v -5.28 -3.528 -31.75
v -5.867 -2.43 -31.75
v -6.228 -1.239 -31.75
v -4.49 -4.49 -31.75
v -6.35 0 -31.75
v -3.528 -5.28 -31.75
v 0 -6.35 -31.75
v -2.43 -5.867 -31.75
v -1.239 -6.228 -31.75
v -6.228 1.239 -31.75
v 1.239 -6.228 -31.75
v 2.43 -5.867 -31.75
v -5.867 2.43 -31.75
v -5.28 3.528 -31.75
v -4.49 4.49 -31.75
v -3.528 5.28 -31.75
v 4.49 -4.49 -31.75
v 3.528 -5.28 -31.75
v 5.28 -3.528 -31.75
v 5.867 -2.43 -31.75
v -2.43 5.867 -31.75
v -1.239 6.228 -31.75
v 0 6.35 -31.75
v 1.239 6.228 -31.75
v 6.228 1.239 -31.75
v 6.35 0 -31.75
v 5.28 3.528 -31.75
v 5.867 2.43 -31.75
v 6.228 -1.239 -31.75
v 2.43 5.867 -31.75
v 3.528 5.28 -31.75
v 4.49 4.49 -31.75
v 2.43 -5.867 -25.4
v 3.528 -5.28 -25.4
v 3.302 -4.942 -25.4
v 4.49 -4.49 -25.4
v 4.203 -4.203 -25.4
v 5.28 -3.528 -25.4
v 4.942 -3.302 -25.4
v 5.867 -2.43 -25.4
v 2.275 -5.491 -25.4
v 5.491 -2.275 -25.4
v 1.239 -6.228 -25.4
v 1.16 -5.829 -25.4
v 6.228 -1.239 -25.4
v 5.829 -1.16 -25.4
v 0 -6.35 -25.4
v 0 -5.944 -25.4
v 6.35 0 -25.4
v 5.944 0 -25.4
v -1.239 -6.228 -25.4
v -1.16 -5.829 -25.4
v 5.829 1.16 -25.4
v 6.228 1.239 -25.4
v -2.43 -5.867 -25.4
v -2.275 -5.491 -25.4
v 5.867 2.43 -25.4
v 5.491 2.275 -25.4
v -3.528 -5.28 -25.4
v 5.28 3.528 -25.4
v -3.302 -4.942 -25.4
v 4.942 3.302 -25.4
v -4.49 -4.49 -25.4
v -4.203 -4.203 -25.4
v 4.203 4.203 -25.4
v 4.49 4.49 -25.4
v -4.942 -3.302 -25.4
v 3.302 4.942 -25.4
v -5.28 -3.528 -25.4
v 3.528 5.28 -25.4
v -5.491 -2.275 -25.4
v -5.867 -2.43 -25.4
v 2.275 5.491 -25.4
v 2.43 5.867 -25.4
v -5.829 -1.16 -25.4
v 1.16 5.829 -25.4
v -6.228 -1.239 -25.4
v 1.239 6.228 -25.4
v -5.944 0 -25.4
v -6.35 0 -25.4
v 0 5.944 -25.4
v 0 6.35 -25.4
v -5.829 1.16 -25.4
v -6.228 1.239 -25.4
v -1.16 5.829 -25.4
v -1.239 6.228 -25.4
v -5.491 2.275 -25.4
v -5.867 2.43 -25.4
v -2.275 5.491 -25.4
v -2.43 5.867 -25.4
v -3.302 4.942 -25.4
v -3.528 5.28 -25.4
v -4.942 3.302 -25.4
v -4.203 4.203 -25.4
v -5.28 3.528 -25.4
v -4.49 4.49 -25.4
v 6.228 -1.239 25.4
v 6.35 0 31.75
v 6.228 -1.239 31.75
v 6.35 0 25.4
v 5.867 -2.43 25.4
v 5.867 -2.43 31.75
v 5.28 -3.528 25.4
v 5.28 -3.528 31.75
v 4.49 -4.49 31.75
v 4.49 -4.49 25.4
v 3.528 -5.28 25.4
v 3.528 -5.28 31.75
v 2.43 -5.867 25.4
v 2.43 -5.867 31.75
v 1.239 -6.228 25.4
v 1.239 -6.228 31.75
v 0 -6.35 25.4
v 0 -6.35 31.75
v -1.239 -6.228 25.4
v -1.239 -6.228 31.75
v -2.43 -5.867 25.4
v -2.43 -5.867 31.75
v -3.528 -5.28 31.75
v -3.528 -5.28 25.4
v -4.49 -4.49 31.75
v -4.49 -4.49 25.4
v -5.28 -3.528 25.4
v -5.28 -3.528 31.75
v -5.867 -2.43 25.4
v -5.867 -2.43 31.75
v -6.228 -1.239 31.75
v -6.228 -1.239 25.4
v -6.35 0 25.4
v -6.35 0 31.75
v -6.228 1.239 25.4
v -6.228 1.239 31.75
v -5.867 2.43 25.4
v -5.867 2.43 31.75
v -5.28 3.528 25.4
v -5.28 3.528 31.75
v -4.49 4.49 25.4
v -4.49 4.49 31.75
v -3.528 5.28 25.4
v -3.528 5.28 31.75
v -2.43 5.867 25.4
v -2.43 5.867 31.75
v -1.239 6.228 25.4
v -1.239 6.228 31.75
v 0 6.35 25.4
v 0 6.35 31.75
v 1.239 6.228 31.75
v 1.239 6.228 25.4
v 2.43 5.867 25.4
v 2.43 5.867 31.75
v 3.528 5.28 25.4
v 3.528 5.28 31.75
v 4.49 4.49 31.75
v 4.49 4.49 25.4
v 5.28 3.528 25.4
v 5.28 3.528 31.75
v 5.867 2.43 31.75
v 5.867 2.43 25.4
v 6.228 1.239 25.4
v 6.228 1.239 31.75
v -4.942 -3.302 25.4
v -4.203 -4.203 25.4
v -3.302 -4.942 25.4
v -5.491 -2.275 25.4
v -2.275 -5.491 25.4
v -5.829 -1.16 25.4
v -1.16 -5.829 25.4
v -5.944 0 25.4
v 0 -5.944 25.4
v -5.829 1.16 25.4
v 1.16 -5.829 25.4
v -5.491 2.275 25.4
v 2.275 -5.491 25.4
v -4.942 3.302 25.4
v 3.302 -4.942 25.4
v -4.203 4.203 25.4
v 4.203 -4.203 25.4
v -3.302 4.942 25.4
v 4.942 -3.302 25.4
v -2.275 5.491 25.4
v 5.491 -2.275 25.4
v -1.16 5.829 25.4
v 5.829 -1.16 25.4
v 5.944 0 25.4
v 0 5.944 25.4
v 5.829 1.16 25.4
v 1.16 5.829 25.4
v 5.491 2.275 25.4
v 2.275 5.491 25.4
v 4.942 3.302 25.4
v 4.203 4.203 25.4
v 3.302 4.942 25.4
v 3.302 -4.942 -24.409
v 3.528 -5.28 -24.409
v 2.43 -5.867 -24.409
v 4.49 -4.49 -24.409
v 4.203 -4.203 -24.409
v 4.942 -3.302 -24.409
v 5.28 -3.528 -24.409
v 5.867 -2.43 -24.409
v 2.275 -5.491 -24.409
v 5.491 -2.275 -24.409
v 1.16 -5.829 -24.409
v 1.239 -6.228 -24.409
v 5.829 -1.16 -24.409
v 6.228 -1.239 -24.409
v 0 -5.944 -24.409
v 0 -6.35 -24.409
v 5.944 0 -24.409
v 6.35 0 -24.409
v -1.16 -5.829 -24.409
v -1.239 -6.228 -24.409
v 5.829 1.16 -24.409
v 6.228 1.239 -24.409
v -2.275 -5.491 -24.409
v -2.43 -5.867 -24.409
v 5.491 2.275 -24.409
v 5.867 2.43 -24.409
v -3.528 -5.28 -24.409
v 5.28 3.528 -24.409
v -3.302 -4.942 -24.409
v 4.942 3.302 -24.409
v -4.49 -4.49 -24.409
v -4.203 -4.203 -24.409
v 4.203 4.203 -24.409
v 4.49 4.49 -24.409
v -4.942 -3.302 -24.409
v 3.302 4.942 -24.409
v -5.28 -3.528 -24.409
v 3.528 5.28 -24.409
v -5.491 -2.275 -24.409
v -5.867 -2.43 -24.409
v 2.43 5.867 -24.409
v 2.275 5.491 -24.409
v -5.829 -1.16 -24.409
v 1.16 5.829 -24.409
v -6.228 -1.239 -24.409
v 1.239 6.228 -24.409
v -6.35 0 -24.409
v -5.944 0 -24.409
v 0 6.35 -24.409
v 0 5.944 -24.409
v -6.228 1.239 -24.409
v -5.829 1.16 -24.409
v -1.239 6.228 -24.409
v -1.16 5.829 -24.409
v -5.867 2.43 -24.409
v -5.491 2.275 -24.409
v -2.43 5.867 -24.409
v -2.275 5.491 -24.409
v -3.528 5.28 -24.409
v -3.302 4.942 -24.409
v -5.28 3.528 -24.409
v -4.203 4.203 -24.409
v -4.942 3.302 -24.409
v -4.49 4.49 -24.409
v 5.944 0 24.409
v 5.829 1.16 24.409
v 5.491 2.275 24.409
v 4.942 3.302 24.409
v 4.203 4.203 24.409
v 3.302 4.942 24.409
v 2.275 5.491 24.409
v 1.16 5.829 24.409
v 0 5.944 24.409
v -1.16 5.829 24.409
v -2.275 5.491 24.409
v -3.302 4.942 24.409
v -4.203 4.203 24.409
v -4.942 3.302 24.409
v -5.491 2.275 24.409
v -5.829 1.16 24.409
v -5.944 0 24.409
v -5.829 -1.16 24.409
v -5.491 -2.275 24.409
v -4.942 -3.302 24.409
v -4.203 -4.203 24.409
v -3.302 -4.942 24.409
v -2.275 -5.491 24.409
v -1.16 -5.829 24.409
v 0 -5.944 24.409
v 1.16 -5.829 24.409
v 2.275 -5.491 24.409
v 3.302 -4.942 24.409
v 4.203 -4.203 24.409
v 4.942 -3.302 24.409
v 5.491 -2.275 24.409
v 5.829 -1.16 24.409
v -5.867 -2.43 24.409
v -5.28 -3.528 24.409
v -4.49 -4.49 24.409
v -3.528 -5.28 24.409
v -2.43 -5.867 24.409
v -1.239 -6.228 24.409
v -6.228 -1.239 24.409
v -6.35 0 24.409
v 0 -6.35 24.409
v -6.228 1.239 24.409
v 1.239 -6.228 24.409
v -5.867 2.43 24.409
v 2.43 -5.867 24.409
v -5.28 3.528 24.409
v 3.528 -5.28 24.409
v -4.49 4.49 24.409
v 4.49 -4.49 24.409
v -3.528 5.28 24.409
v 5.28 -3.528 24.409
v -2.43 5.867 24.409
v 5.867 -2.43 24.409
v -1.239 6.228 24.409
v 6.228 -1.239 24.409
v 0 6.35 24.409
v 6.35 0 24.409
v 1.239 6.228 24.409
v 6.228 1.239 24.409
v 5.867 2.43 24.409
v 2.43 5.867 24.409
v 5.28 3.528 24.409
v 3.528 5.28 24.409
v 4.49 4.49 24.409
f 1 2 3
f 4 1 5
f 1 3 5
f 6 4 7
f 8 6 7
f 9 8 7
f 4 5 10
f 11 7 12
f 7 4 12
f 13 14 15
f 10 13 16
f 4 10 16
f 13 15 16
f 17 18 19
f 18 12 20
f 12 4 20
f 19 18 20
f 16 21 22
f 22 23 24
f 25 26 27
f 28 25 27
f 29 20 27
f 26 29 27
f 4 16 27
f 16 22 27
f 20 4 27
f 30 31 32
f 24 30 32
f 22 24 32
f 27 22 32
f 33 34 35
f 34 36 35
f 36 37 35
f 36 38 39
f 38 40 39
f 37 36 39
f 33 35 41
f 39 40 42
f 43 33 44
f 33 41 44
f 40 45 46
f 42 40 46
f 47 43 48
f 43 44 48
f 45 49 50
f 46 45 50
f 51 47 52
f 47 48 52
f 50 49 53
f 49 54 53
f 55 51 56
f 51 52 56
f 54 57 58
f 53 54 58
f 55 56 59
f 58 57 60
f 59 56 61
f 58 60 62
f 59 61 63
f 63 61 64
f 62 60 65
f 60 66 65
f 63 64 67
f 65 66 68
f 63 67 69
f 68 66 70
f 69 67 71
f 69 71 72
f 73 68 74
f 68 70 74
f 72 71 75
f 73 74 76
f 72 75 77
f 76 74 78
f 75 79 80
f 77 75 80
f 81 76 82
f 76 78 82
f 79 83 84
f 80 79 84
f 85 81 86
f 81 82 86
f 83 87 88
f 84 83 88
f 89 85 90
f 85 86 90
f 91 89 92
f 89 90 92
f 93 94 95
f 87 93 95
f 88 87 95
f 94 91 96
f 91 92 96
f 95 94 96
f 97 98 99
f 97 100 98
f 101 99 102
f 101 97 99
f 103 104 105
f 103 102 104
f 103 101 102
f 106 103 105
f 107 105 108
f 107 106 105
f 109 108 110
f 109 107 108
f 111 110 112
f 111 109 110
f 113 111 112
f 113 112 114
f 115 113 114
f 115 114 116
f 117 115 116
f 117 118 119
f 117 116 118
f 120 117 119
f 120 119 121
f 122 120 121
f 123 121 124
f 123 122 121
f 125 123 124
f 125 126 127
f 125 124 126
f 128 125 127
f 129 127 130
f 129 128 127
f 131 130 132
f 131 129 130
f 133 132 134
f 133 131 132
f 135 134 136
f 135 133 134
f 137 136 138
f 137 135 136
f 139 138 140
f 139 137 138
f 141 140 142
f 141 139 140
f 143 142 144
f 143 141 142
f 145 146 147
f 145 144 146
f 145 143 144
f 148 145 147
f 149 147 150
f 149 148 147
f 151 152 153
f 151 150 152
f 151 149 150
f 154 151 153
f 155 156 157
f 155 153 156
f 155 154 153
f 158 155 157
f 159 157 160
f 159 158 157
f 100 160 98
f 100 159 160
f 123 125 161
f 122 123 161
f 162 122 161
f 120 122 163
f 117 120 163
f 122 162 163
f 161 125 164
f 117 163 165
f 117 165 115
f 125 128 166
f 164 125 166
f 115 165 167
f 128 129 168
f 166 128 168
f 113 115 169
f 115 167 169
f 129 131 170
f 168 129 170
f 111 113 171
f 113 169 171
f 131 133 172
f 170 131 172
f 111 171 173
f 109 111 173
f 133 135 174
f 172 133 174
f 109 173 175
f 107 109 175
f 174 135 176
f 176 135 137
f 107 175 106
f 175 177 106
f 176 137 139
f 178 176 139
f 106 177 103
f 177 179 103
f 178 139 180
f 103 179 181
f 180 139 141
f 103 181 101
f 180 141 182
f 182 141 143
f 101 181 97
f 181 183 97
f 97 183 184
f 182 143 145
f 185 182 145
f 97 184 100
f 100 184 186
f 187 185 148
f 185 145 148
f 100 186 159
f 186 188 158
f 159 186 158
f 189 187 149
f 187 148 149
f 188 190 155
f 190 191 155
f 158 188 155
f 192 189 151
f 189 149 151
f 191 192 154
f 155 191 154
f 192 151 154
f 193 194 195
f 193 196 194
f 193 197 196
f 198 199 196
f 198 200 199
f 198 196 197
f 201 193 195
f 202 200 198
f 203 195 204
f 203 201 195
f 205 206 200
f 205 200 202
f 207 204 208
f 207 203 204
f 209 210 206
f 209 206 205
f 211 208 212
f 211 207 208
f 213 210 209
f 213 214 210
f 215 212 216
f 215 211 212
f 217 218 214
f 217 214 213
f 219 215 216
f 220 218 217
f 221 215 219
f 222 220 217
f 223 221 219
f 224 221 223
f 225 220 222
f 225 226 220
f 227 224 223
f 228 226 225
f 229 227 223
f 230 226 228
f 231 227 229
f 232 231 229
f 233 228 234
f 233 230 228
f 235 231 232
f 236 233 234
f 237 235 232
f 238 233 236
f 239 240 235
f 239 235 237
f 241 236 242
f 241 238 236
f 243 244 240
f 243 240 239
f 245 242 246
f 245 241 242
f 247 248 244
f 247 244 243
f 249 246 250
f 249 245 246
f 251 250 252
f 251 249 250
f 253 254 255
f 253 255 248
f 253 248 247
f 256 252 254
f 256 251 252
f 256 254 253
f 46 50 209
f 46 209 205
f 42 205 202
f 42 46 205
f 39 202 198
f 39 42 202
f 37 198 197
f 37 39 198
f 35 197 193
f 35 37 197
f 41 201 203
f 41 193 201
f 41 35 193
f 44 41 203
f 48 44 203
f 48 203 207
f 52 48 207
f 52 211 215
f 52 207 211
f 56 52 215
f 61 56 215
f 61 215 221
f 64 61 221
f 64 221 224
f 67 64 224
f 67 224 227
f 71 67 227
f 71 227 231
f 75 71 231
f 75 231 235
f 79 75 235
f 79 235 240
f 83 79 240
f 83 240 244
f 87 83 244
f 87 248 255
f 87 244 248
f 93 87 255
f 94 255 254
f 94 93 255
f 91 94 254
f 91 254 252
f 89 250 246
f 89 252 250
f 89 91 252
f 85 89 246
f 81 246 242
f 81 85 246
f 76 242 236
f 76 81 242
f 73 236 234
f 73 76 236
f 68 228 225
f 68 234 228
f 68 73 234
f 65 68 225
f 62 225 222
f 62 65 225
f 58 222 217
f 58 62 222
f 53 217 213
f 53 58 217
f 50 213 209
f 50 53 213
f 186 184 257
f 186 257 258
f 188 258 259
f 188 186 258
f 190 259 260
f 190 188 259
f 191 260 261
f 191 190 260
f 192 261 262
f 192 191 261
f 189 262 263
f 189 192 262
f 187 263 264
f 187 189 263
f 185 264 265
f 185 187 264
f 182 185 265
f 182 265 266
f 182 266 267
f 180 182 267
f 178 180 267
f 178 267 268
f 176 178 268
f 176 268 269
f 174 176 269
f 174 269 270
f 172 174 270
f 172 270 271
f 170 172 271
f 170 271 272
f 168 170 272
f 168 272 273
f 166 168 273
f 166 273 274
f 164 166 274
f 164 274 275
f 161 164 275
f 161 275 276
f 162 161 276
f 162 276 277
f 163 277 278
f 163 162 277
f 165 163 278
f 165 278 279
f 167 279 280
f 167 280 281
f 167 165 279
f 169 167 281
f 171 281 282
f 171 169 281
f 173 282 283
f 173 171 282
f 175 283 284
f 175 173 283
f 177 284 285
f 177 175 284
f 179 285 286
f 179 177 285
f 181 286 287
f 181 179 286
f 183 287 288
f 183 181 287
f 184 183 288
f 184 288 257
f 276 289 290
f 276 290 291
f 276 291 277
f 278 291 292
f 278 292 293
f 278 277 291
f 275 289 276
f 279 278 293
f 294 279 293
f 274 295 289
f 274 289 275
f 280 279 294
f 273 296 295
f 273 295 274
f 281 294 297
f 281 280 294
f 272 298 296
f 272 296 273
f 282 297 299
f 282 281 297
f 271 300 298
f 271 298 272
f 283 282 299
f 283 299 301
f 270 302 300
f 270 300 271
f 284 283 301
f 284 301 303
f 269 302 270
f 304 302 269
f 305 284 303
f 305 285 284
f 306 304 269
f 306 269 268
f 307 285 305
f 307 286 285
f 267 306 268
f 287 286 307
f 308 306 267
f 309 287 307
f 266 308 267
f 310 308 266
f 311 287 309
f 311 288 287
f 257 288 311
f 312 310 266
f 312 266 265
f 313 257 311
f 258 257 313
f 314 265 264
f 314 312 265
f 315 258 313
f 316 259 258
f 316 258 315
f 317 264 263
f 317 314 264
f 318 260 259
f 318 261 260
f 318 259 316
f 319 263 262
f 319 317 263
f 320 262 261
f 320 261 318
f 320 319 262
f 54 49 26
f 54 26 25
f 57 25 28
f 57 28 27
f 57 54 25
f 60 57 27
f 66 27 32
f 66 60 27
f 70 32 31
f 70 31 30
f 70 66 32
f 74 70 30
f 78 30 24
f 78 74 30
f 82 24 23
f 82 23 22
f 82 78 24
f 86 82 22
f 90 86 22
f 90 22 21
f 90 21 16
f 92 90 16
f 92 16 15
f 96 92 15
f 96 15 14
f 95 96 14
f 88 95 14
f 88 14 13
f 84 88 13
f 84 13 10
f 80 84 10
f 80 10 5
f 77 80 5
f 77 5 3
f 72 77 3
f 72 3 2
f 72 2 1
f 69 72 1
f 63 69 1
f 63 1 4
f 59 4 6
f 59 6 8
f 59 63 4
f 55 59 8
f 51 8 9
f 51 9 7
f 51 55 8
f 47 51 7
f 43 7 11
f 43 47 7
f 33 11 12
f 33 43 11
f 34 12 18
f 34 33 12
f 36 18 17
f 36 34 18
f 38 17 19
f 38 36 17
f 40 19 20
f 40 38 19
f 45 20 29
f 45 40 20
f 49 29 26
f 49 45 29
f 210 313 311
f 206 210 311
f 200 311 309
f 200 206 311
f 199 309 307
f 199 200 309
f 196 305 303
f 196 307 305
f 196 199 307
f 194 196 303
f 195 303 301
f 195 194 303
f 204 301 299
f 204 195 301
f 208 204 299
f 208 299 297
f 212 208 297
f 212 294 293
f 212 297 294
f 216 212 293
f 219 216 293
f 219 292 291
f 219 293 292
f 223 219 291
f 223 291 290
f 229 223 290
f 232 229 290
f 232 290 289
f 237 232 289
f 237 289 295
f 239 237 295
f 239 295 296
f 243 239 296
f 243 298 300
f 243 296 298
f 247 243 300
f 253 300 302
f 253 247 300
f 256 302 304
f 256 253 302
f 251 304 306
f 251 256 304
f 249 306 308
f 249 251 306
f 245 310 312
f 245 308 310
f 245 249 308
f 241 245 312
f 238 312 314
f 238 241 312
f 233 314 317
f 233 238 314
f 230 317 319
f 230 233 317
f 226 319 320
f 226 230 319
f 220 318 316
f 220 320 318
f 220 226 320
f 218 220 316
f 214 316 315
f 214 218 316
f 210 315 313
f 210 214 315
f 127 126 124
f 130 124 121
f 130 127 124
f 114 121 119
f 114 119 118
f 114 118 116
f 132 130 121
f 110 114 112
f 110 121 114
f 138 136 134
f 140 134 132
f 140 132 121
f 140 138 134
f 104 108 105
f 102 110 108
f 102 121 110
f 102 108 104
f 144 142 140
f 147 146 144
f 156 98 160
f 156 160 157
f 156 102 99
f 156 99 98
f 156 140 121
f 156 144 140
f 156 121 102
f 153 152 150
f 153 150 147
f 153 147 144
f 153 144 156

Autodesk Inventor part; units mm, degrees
ref_plane "YZ Plane" through (0, 0, 0) normal (1, 0, 0) x (0, 1, 0)
ref_plane "XZ Plane" through (0, 0, 0) normal (0, 1, 0) x (-1, 0, 0)
sketch "Sketch1" plane through (0, 0, 0) normal (0, 0, 1) x (1, 0, 0)
  circle A0 centre (0, 0) radius 6.35
  dimension "d0" = 12.7
extrude "Extrusion1" add sketch "Sketch1" along normal mid plane 63.5
ref_plane "Work Plane1" through (0, 0, 25.4) normal (0, 0, 1) x (1, 0, 0)
sketch "Sketch2" plane through (0, 0, 25.4) normal (0, 0, 1) x (1, 0, 0)
  circle A0 centre (0, 0) radius 6.35 projected
  circle A1 centre (0, 0) radius 6.35
  circle A2 centre (0, 0) radius 5.9436
  dimension "d4" = 12.7
  dimension "d5" = 11.8872
extrude "Extrusion2" cut sketch "Sketch2" against normal blind 0.9906
mirror "Mirror1" about plane through (0, 0, 0) normal (0, 0, 1) of "Extrusion2"
ref_plane "Work Plane2" through (0, 0, -25.4) normal (0, 0, 1) x (1, 0, 0)
properties part number "Linear Actuator Top Scoop Pin .5in. Dia." material "Aluminum 6061"
